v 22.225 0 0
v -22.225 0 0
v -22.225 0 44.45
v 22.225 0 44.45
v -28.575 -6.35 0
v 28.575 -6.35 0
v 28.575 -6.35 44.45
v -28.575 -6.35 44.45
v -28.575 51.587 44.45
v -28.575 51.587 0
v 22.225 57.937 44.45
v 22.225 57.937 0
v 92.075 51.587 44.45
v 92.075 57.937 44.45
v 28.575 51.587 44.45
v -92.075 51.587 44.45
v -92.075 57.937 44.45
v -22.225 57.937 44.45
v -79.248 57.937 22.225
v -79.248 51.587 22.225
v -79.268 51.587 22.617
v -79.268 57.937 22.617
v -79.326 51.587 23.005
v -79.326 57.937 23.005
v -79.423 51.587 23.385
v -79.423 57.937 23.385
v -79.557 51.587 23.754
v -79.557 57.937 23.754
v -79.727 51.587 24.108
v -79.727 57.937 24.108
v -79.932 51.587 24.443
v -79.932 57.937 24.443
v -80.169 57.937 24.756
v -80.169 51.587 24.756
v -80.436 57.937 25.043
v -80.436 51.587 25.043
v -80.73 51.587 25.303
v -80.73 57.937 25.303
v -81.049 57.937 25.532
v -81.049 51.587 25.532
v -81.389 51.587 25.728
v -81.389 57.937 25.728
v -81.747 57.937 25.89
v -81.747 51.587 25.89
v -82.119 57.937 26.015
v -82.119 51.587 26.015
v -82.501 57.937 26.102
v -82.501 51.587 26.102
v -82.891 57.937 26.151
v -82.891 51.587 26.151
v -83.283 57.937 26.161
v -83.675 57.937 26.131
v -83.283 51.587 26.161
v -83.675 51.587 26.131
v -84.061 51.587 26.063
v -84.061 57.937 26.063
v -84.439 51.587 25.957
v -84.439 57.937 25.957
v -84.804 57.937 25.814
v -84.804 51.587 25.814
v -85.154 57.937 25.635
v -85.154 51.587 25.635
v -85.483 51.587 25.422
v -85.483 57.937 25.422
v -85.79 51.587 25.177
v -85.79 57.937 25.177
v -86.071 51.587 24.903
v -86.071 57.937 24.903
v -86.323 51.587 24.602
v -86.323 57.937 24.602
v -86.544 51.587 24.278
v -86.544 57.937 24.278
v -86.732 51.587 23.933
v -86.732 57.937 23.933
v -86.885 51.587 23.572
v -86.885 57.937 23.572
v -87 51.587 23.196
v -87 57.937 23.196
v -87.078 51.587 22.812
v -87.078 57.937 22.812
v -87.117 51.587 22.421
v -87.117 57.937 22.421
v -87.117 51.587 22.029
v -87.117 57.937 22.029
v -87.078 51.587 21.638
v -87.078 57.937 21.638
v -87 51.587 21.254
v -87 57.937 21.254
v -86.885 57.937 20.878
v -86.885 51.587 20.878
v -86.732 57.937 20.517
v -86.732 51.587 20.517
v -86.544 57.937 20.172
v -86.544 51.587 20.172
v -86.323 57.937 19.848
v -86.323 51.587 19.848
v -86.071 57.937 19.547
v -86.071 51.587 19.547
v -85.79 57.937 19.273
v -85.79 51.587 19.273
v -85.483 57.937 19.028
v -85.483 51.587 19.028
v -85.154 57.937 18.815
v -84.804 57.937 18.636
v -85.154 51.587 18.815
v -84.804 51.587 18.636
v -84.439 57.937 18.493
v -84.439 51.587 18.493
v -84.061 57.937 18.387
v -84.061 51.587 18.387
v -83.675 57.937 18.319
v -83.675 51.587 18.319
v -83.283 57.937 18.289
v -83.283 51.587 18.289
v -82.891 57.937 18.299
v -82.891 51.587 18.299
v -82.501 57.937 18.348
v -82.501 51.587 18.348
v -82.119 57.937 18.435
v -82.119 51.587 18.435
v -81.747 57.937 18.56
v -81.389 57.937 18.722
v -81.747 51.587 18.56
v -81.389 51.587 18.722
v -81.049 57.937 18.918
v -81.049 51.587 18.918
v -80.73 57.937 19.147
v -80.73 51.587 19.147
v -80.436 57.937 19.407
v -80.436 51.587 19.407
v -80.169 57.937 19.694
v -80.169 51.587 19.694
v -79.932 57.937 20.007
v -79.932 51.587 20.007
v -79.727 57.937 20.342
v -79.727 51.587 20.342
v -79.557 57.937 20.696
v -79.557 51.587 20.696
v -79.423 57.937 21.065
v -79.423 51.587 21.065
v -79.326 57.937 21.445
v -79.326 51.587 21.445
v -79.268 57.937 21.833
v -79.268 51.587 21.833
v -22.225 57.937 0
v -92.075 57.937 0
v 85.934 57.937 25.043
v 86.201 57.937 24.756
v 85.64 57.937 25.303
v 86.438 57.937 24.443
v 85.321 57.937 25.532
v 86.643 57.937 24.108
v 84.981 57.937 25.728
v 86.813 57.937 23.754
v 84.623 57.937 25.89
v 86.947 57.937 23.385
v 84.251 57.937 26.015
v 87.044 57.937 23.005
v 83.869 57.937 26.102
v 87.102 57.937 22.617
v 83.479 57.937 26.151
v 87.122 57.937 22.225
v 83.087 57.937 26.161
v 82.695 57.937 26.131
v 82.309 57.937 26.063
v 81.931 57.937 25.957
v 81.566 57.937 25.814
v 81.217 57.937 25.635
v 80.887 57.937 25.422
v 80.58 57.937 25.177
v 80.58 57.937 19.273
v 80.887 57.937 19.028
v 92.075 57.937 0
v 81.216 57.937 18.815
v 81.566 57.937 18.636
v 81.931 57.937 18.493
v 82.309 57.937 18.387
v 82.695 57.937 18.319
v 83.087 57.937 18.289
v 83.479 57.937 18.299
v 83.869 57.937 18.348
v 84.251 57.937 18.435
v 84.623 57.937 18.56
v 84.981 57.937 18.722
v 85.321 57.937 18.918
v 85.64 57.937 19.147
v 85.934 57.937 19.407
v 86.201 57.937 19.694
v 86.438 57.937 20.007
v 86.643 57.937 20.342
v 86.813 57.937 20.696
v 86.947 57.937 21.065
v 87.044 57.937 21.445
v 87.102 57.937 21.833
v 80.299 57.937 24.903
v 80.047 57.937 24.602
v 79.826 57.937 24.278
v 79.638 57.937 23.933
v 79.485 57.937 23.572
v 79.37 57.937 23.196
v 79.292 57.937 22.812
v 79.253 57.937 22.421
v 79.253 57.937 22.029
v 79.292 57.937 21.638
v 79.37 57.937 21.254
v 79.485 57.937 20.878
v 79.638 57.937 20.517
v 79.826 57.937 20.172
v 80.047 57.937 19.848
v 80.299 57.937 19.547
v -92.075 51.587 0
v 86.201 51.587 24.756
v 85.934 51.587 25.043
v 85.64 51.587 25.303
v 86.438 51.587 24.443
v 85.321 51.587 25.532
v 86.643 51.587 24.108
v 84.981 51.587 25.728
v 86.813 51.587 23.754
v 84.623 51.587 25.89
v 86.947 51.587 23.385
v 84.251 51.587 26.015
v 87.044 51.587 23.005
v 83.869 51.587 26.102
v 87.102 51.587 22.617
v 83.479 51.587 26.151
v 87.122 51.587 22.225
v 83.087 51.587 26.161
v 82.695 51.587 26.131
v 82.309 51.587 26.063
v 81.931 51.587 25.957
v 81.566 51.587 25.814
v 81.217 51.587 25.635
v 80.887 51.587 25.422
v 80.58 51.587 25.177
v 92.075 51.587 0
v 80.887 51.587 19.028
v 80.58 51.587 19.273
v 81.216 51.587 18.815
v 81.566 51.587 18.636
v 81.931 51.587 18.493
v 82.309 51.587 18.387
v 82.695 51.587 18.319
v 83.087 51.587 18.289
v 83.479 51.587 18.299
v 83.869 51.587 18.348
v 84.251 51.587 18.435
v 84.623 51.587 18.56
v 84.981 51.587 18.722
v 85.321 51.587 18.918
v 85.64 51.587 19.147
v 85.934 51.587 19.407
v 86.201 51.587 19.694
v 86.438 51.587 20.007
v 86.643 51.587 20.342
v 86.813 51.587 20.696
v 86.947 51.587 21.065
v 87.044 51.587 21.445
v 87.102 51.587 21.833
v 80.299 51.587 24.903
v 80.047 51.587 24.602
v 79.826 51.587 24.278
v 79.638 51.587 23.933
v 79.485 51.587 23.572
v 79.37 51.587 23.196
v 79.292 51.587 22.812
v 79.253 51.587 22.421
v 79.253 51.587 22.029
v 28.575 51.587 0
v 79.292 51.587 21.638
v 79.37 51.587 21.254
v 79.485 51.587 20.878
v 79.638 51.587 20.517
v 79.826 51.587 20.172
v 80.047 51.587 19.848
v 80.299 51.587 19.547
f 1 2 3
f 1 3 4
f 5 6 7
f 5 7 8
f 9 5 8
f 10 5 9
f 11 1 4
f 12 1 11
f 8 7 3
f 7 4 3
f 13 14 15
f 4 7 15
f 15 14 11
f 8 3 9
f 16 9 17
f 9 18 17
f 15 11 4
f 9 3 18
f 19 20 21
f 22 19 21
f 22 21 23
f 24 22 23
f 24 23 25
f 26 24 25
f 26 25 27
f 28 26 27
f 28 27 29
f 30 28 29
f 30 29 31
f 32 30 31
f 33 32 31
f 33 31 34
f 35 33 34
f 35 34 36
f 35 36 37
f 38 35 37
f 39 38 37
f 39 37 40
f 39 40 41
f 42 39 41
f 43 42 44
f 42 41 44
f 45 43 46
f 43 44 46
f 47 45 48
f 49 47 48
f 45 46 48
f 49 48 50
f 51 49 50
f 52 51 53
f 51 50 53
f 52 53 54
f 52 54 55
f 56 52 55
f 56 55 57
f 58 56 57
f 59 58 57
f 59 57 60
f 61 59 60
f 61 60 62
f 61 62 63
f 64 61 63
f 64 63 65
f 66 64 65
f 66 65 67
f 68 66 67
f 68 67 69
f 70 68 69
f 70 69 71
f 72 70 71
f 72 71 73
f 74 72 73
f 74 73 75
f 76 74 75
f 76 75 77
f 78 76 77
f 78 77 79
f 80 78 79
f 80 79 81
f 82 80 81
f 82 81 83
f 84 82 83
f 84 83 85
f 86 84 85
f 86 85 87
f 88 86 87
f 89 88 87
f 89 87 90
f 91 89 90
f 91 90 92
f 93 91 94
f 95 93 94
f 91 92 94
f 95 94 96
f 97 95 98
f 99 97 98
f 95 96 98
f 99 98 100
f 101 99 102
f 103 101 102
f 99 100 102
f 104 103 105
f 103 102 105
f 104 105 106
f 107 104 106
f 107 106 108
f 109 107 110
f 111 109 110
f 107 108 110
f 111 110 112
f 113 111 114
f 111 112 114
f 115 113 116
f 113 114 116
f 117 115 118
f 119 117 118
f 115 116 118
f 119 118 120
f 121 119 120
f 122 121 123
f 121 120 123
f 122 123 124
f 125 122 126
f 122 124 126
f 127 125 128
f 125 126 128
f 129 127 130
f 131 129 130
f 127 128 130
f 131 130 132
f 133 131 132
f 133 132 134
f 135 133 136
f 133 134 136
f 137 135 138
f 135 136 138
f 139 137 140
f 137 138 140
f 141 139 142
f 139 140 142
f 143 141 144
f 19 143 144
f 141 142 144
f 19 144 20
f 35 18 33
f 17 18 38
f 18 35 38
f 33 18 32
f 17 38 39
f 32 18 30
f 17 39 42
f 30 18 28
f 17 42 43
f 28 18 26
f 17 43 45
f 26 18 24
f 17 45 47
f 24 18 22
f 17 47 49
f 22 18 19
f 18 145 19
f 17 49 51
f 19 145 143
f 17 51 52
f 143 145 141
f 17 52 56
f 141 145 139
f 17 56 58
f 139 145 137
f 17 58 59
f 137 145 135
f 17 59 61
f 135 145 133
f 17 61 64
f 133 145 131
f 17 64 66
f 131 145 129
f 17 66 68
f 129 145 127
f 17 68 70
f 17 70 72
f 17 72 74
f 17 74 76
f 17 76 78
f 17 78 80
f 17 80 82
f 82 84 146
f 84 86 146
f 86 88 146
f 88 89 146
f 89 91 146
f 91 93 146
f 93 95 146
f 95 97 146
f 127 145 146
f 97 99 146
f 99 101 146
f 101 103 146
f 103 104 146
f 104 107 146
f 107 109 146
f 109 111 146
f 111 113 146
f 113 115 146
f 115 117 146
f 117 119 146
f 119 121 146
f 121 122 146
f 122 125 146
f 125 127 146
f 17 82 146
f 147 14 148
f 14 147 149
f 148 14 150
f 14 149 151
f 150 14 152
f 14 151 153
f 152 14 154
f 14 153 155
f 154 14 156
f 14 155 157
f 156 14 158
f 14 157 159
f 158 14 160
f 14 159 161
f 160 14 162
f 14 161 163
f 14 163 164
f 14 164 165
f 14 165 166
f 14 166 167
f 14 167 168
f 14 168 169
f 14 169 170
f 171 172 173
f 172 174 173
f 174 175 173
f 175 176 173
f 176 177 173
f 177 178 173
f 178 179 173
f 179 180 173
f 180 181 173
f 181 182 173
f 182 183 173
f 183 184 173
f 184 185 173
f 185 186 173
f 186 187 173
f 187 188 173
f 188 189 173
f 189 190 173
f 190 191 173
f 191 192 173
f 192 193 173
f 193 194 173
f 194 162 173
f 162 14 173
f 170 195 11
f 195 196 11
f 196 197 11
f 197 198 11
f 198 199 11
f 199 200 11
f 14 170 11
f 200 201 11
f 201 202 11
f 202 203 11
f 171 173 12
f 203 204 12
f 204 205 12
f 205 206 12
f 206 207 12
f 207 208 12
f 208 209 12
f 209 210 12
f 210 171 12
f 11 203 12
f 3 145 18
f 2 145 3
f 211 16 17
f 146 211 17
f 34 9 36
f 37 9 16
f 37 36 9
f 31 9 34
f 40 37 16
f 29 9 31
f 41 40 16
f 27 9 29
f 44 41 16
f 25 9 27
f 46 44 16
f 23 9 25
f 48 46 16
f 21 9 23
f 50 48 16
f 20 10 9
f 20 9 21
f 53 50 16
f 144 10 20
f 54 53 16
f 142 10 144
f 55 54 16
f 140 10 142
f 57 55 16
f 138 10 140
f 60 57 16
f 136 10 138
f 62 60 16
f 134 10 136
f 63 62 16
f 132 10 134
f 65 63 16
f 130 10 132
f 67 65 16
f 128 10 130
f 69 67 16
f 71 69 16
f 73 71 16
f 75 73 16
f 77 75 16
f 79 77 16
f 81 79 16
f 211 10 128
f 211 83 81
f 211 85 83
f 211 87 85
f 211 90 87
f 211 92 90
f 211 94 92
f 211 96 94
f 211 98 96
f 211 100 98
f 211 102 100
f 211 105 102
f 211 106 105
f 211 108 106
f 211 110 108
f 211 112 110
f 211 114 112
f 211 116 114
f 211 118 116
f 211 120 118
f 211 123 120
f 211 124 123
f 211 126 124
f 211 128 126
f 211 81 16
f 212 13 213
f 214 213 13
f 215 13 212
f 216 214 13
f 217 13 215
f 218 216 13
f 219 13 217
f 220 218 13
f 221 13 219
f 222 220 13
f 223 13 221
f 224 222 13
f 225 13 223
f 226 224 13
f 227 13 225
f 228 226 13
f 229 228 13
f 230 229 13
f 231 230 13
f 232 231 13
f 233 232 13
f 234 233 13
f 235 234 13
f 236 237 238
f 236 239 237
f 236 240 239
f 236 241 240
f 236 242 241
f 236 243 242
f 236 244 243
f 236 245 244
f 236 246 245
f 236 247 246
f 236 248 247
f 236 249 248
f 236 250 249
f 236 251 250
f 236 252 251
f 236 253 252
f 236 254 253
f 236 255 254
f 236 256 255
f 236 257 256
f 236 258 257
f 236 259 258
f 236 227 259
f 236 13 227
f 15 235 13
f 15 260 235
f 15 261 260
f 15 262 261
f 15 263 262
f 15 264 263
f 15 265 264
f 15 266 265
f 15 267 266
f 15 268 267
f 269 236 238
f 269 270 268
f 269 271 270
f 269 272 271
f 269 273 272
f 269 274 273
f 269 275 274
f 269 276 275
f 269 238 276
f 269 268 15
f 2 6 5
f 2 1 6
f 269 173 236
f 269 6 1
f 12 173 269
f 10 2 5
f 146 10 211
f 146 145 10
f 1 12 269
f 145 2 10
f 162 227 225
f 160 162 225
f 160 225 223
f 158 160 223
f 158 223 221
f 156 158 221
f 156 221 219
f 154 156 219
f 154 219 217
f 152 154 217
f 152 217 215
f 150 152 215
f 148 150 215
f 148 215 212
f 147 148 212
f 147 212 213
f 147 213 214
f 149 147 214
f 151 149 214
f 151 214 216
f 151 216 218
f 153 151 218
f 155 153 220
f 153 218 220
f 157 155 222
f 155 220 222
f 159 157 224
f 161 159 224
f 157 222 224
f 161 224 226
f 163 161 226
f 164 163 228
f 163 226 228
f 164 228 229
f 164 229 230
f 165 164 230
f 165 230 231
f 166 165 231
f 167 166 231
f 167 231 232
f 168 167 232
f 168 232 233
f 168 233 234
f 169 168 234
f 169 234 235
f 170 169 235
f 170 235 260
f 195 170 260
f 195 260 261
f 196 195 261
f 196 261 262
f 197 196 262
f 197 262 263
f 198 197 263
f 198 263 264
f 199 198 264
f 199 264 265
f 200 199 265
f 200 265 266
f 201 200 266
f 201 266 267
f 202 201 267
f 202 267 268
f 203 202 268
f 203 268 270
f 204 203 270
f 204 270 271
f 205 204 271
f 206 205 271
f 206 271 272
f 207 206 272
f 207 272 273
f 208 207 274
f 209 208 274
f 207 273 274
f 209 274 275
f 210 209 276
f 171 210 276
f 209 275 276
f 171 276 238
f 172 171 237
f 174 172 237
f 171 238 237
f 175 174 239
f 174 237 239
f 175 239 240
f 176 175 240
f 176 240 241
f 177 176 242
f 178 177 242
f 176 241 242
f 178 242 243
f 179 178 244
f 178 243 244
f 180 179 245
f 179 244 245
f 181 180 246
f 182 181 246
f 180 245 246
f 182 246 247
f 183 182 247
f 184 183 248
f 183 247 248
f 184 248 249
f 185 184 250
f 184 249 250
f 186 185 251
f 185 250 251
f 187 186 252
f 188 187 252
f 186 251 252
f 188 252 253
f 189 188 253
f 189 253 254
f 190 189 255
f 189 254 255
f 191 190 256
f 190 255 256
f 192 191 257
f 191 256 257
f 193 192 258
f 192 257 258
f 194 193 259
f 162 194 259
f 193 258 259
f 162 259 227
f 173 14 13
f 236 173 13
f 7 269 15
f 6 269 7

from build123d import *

# Parameters (mm, degrees)
BOSS_EXTRUDE1_DEPTH = 44.45
SKETCH2_R           = 3.937
CUT_EXTRUDE1_DEPTH  = 118.517447401


with BuildPart() as part:
    # Sketch1 → Boss-Extrude1 (new body)
    with BuildSketch(Plane.XY):
        Polygon((-22.225, 0), (22.225, 0), (22.225, 57.9374), (28.575, 57.9374), (92.075, 57.9374), (92.075, 51.5874), (28.575, 51.5874), (28.575, -6.35), (-28.575, -6.35), (-28.575, 51.5874), (-92.075, 51.5874), (-92.075, 57.9374), (-28.575, 57.9374), (-22.225, 57.9374), align=None)
    extrude(amount=BOSS_EXTRUDE1_DEPTH)

    # Sketch2 → Cut-Extrude1 (cut, through all)
    with BuildSketch(Plane.XZ.offset(-51.5874)):
        with Locations((83.185, 22.225)):
            Circle(SKETCH2_R)
        with Locations((-83.185, 22.225)):
            Circle(SKETCH2_R)
    extrude(amount=-CUT_EXTRUDE1_DEPTH, mode=Mode.SUBTRACT)


solid = part.part
